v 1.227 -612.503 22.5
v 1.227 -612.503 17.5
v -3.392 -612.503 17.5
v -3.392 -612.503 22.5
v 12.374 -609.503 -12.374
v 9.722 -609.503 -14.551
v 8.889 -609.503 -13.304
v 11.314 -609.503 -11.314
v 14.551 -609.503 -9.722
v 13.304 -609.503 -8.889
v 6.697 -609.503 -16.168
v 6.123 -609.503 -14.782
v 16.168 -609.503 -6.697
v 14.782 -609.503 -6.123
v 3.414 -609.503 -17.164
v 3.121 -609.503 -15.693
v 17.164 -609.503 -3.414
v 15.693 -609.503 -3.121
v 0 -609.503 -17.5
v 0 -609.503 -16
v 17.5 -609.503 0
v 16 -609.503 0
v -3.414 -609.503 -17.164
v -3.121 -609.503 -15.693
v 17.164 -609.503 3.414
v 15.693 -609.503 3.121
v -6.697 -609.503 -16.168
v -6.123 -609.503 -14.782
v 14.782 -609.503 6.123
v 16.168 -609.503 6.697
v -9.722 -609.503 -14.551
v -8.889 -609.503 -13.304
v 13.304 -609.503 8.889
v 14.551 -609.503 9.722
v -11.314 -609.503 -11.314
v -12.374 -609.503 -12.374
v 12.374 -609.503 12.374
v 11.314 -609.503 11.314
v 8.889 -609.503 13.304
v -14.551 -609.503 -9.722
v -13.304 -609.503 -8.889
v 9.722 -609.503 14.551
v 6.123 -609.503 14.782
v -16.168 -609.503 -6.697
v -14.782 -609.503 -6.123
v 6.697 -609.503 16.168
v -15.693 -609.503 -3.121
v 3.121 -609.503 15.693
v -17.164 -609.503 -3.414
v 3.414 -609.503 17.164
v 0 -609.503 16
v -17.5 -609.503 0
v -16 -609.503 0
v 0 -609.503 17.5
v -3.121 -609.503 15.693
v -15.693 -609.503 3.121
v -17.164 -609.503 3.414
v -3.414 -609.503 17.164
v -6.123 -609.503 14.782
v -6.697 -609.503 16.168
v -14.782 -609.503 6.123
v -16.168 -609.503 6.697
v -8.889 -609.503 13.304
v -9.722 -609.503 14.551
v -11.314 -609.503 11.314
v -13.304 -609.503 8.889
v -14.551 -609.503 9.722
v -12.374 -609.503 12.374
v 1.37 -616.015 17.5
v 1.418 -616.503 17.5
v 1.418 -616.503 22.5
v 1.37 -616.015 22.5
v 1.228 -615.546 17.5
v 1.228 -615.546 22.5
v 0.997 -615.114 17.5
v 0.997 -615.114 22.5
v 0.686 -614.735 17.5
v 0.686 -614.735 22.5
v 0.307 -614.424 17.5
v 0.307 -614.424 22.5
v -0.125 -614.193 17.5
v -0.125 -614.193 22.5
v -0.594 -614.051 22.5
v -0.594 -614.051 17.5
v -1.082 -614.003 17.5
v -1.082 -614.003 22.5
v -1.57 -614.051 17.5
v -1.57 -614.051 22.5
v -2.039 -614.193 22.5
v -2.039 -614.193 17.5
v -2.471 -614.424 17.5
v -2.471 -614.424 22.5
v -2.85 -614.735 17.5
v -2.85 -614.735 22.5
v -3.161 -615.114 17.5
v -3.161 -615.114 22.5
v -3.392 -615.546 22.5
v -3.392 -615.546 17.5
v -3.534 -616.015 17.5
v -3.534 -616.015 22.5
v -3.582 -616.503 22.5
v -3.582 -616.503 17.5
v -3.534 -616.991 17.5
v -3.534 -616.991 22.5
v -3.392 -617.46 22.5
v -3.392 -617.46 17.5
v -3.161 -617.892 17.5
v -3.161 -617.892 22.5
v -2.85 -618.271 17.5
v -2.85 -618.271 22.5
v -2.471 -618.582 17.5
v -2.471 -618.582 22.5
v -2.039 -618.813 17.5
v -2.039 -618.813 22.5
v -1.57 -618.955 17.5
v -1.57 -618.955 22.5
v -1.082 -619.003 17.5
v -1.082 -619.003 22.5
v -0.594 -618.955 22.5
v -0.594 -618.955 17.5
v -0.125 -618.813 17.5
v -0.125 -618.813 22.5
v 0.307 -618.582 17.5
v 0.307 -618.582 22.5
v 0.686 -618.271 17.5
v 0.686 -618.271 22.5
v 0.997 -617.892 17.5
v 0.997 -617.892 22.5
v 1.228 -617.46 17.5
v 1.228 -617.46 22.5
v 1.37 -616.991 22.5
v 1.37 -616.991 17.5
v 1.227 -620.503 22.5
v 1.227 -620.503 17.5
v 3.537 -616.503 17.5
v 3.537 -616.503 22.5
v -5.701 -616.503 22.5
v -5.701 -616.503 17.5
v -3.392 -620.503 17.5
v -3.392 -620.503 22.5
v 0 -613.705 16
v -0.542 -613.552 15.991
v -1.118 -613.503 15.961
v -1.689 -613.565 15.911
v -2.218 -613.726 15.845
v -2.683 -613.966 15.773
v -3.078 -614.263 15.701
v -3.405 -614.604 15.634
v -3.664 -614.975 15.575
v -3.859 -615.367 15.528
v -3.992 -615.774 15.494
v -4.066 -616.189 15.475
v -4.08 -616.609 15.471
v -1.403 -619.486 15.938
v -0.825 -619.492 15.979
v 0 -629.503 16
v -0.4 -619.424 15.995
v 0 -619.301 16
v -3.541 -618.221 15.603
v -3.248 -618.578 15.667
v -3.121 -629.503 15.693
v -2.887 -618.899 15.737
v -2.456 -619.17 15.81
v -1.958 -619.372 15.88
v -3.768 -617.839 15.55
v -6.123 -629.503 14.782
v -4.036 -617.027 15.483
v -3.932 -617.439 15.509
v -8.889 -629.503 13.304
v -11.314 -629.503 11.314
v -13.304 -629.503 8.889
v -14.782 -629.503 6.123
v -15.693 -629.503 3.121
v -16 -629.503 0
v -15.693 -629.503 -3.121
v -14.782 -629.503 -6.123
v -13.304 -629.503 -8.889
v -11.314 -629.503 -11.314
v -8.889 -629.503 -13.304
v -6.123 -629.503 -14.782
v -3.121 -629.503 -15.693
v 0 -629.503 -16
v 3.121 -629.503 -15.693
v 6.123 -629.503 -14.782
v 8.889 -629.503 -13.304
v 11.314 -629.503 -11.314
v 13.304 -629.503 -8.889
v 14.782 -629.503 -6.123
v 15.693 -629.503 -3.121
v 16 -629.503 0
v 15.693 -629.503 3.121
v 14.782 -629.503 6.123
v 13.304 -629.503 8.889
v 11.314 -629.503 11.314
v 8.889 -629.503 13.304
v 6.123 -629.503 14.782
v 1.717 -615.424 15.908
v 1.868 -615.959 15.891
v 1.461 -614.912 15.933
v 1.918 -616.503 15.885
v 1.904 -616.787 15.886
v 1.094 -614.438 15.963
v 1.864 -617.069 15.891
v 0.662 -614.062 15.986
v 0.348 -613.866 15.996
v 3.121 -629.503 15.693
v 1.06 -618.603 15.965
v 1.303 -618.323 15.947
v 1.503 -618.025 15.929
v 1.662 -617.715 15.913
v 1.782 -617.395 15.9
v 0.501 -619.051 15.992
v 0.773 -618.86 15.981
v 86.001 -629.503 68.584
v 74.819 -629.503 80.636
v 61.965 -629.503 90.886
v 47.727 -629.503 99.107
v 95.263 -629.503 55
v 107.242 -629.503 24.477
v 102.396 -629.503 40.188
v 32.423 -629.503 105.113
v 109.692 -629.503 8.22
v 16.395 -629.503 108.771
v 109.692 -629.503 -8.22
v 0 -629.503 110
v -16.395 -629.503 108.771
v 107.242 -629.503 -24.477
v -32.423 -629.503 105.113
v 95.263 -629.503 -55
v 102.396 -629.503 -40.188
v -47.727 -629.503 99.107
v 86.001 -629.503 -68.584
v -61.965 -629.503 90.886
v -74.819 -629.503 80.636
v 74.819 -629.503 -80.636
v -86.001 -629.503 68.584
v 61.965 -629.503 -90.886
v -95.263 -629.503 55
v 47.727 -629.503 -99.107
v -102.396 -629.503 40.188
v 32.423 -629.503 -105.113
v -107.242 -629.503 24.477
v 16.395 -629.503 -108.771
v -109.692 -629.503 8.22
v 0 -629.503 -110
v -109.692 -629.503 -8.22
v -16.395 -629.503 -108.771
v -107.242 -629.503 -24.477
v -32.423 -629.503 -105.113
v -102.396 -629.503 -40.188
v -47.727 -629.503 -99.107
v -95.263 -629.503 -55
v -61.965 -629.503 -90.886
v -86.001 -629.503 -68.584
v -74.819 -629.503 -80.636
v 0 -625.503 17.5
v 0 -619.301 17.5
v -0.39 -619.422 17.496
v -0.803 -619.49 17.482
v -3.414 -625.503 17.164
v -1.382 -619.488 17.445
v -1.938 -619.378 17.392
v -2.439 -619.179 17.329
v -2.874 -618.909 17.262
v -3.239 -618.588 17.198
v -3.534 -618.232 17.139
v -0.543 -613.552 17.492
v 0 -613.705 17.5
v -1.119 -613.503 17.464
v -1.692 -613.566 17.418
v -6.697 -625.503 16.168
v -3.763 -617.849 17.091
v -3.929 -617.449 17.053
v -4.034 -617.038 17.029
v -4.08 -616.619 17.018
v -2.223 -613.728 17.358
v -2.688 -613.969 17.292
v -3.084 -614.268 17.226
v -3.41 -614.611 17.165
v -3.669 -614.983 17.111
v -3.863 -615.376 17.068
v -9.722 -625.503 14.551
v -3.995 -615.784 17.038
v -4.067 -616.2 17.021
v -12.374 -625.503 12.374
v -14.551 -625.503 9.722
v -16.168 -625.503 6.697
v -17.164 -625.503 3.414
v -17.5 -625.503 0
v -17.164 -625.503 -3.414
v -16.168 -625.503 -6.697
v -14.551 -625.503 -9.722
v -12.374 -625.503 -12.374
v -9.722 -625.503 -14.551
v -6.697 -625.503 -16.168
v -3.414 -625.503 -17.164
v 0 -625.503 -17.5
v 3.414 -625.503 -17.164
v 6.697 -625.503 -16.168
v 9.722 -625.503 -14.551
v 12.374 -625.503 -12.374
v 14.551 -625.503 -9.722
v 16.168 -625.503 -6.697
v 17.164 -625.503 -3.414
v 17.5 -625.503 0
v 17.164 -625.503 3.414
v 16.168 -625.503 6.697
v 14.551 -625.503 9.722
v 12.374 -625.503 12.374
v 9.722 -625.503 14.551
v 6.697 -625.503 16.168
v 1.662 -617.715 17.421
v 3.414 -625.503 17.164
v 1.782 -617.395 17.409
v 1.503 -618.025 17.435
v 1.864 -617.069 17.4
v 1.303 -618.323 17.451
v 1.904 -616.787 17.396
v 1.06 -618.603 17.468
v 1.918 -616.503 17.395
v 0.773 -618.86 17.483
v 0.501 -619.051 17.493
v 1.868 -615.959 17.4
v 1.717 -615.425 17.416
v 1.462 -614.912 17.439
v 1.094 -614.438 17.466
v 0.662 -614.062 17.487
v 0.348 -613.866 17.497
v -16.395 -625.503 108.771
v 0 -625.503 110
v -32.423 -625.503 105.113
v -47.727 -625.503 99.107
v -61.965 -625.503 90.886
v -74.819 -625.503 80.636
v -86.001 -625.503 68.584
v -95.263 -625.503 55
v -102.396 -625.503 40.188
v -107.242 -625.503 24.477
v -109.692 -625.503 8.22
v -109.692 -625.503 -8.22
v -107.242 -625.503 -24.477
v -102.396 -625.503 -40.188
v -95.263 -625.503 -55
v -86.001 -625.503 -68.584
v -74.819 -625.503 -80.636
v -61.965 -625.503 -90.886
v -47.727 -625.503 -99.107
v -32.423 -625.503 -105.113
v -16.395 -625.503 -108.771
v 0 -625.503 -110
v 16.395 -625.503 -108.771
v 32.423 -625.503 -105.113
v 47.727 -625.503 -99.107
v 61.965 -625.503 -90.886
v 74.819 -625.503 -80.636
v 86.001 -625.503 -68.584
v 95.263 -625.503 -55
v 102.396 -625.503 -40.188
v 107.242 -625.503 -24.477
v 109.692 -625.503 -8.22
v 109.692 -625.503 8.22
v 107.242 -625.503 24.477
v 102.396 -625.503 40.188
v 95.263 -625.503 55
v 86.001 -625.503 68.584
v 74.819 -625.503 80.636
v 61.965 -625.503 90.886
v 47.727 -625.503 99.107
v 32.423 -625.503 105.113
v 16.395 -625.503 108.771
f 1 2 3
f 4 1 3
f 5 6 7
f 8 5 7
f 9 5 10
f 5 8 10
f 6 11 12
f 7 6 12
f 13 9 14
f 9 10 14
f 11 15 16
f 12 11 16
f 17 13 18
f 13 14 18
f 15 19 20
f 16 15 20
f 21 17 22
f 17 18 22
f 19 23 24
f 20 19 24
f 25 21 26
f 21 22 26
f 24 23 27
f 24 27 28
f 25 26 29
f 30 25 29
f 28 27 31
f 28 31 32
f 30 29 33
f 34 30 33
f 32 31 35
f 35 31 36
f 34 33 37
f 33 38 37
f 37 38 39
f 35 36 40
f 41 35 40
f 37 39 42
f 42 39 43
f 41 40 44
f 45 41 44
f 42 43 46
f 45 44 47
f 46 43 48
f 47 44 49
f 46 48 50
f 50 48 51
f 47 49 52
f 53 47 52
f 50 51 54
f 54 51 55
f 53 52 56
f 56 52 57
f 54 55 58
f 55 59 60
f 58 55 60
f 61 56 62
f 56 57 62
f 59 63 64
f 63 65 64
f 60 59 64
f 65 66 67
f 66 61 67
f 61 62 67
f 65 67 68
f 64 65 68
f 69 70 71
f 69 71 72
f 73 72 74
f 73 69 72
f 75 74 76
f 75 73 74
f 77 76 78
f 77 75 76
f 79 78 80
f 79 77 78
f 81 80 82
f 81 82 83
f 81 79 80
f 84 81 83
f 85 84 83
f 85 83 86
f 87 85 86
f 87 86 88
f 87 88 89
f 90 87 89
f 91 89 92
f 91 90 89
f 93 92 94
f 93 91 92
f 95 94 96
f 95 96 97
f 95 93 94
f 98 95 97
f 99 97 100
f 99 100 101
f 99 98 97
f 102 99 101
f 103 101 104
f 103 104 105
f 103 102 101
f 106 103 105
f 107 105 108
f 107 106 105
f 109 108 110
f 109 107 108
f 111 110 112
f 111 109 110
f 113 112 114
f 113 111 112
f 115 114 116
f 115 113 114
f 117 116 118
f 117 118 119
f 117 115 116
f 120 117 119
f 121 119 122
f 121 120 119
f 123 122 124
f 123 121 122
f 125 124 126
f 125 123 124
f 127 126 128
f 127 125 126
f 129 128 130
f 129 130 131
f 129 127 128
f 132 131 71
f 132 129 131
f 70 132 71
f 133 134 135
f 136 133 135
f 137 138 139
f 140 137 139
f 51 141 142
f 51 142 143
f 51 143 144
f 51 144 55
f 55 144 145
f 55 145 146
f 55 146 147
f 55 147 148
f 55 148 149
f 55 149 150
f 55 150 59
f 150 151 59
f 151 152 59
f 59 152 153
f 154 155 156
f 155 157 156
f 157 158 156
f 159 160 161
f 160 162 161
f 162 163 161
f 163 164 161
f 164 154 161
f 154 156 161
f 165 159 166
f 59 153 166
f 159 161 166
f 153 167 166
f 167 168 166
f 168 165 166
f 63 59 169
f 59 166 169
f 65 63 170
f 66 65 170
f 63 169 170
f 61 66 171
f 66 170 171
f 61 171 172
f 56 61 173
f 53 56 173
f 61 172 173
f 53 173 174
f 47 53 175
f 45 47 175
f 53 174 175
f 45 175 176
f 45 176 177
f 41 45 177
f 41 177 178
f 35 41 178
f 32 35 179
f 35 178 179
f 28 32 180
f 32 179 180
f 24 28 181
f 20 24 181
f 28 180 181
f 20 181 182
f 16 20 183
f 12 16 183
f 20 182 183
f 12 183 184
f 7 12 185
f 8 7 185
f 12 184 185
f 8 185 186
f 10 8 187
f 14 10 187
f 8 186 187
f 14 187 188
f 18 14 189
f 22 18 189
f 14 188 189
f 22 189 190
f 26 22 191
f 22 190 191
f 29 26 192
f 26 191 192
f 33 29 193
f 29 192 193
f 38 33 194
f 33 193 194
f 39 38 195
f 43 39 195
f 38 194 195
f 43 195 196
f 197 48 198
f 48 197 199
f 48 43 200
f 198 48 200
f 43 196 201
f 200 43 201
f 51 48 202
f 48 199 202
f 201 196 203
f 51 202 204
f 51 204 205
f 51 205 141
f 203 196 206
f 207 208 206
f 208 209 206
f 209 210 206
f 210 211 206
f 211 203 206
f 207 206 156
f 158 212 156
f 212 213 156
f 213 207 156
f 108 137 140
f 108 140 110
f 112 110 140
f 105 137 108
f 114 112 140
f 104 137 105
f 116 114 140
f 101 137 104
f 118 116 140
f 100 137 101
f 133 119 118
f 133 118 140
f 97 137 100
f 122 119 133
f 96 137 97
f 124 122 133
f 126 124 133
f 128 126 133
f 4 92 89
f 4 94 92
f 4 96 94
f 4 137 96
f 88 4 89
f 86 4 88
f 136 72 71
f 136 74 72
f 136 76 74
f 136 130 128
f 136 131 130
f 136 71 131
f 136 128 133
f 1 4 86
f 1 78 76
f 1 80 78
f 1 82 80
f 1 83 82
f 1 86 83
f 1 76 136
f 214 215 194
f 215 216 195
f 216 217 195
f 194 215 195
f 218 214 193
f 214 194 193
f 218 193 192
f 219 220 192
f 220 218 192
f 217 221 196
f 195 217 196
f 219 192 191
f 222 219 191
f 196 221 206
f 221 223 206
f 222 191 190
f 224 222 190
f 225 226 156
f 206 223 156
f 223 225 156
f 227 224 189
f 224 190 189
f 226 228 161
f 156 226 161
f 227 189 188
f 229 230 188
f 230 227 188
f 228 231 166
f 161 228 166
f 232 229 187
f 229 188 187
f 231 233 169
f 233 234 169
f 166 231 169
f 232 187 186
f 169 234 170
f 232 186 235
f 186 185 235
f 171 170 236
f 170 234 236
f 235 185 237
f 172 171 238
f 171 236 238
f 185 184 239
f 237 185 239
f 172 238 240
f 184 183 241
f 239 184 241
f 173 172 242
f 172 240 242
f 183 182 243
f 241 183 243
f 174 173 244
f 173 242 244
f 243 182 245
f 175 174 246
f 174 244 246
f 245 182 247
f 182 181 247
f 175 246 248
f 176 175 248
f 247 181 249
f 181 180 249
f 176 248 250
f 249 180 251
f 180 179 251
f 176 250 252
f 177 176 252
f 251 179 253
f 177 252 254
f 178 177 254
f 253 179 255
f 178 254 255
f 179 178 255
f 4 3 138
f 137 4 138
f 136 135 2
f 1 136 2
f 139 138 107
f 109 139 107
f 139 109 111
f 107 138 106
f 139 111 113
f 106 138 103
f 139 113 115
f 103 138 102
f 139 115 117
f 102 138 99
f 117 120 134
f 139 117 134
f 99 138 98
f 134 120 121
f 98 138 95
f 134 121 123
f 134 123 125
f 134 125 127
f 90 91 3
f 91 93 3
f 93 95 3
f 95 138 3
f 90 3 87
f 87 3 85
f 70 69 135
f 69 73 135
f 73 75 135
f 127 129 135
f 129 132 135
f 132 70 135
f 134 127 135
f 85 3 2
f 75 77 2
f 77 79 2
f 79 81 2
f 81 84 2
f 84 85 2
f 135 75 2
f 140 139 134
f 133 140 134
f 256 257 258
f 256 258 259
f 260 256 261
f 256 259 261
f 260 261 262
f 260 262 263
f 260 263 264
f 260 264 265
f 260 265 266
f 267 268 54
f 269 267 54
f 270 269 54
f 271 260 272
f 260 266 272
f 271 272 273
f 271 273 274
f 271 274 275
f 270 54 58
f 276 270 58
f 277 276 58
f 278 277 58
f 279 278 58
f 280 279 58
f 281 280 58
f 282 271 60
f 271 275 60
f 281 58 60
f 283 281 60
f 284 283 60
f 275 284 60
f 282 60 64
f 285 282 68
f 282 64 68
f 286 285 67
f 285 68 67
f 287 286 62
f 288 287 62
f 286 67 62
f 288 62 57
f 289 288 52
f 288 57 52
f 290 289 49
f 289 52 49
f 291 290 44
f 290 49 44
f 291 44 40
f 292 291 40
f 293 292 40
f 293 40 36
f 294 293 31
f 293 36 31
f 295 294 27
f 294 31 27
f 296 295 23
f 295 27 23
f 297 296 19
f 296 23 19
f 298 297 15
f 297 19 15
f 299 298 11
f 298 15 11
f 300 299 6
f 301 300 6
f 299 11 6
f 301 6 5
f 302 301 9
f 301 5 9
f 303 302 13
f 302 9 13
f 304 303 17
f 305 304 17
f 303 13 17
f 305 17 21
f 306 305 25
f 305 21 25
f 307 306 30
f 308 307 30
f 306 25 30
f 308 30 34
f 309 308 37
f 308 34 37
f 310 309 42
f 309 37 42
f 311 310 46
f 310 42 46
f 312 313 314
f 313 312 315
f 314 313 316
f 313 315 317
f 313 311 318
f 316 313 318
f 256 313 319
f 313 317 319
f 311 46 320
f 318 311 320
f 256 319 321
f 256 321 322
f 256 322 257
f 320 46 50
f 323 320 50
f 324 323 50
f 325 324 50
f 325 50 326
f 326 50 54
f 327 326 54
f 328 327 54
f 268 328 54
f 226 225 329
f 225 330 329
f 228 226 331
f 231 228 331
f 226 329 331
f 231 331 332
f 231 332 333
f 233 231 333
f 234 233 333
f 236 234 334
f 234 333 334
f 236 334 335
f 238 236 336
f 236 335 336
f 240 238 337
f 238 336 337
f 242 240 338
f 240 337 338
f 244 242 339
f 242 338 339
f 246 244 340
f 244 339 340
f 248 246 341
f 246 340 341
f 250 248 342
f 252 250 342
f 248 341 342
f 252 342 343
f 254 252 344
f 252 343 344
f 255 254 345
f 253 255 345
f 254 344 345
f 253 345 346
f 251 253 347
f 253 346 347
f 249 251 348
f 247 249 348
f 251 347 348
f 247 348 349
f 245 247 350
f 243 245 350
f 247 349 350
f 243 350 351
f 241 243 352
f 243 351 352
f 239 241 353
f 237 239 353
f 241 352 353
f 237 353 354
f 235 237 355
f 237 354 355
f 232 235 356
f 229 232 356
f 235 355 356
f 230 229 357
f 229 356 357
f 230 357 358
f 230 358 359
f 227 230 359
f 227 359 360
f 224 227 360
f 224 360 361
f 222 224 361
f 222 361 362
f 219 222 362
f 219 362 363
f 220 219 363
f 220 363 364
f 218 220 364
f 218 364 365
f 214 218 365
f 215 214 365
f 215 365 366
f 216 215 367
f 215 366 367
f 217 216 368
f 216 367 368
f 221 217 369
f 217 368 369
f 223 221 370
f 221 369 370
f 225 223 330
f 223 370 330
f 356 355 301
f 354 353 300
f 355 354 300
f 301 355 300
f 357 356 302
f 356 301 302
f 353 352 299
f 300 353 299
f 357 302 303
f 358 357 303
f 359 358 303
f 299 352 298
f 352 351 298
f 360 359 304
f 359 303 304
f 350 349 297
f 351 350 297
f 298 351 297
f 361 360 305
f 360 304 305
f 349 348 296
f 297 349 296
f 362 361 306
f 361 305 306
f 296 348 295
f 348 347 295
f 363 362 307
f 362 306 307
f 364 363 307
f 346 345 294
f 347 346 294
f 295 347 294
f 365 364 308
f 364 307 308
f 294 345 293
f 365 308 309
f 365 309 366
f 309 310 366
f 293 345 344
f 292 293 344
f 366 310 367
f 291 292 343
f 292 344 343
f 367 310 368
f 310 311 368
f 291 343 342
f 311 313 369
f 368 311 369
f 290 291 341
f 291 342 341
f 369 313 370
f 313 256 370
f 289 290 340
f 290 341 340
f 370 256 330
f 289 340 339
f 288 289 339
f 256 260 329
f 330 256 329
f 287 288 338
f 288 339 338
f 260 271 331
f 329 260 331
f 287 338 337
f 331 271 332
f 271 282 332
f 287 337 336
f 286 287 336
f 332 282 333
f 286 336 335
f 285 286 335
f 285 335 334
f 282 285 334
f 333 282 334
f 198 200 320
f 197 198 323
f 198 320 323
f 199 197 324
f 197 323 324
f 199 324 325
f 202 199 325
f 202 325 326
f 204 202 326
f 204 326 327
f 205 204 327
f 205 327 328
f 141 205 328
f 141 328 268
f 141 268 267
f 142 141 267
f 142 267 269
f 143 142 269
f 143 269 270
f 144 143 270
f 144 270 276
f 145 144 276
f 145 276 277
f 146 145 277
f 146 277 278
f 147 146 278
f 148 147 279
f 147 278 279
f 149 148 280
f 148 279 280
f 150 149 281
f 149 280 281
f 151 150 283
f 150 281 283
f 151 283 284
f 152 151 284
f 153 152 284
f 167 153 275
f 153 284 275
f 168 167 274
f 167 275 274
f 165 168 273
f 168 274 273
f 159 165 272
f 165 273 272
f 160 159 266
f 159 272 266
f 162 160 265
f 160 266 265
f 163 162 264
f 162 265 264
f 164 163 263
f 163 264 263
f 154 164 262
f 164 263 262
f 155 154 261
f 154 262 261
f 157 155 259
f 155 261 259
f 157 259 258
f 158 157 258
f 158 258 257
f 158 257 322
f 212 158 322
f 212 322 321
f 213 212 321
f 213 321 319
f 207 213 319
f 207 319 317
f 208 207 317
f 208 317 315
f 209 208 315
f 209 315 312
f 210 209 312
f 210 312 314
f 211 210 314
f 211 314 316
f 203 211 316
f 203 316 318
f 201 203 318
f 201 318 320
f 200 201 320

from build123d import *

# Parameters (mm, degrees)
CUT_EXTRUDE1_REACH      = 653.637
CUT_EXTRUDE1_END_RADIUS = 16
SKETCH3_R               = 3
SKETCH4_R               = 2.5
BOSS_EXTRUDE1_DEPTH     = 5


with BuildPart() as part:
    # Sketch1 → Revolve1 (revolve)
    with BuildSketch(Plane(origin=(0, 0, 0), x_dir=(0, 0, -1), z_dir=(1, 0, 0)), mode=Mode.PRIVATE) as revolve1_sk:
        Polygon((17.5, -625.502918688), (17.5, -609.502918688), (16, -609.502918688), (16, -629.502918688), (110, -629.502918688), (110, -625.502918688), align=None)
    revolve(revolve1_sk.sketch.rotate(Axis((0, 0, 0), (0, -1, 0)), 180), axis=Axis((0, 0, 0), (0, -1, 0)))

    # Cut-Extrude1: up to this cylinder (the profile starts outside it)
    cut_extrude1_end = Plane(origin=(0, -616.502919, 0), z_dir=(0, 1, 0)) * Cylinder(CUT_EXTRUDE1_END_RADIUS, 1340.274, mode=Mode.PRIVATE)
    # Sketch3 → Cut-Extrude1 (cut, up to the surface)
    with BuildSketch(Plane.XY.offset(17.5), mode=Mode.PRIVATE) as cut_extrude1_sk1:
        with Locations((-1.082153425, -616.502918688)):
            Circle(SKETCH3_R)
    cut_extrude1_tool1 = extrude(cut_extrude1_sk1.sketch, amount=-CUT_EXTRUDE1_REACH, mode=Mode.PRIVATE) - cut_extrude1_end
    add(cut_extrude1_tool1.solids().sort_by_distance((-1.082153, -616.502919, 17.5))[0], mode=Mode.SUBTRACT)


with BuildPart() as body_2:
    # Sketch4 → Boss-Extrude1 (new body)
    with BuildSketch(Plane.XY.offset(17.5)):
        Polygon((3.536648728, -616.502918688), (1.227247651, -612.502918688), (-3.391554502, -612.502918688), (-5.700955579, -616.502918688), (-3.391554502, -620.502918688), (1.227247651, -620.502918688), align=None)
        with Locations((-1.082153425, -616.502918688)):
            Circle(SKETCH4_R, mode=Mode.SUBTRACT)
    extrude(amount=BOSS_EXTRUDE1_DEPTH)


solid = Compound([part.part, body_2.part])
